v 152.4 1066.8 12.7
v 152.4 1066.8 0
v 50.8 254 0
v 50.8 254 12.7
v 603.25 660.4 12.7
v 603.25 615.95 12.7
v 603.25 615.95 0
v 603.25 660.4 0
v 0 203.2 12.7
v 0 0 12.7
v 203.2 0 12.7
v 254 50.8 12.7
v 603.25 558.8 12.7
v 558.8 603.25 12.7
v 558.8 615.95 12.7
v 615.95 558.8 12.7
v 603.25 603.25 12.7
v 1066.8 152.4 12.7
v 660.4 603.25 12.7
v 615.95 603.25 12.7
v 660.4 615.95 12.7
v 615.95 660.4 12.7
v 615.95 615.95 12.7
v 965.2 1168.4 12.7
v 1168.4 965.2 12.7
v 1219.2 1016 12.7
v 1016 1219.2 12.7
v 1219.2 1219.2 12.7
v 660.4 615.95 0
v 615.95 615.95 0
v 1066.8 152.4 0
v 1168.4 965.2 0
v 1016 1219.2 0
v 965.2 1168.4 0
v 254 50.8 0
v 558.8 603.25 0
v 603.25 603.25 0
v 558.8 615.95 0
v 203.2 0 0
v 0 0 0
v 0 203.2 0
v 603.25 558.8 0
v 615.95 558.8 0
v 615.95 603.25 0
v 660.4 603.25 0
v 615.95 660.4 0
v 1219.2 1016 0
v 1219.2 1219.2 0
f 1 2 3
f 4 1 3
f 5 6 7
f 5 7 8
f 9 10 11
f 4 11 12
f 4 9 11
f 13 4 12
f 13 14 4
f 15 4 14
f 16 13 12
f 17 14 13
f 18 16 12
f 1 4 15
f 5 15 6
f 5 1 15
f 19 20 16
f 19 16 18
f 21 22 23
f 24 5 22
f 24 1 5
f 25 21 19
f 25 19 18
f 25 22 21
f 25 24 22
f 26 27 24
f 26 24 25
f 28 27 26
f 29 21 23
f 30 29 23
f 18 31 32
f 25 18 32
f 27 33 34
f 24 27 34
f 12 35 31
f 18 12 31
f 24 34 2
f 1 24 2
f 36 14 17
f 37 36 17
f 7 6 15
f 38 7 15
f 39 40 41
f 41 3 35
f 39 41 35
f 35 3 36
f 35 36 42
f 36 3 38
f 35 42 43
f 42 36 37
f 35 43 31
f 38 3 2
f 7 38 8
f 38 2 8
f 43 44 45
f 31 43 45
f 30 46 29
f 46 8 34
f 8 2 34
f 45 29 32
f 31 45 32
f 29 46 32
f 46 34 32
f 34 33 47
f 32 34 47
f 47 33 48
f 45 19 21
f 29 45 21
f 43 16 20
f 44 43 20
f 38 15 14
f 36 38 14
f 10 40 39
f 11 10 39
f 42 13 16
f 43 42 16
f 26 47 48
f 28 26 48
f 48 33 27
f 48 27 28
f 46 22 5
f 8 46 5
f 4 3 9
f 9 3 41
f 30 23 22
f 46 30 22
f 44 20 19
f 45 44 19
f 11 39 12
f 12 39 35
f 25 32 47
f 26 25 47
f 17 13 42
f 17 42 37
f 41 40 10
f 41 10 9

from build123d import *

# Parameters (mm, degrees)
F0_W     = 1219.2
F0_H     = 1219.2
F1_DEPTH = 12.7
F3_DEPTH = 12.701
F5_DEPTH = 12.701
F6_W     = 6.35
F6_H     = 44.45
F6_W_2   = 44.45
F6_H_2   = 6.35
F7_DEPTH = 12.701


with BuildPart() as f1:
    # F0 (on Top) → F1 (new body)
    with BuildSketch(Plane.XY):
        with Locations((609.6, 609.6)):
            Rectangle(F0_W, F0_H)
    extrude(amount=F1_DEPTH)

    # F2 (on face) → F3 (cut, through all)
    with BuildSketch(Plane(origin=(0, 0, 0), x_dir=(1, 0, 0), z_dir=(0, 0, -1))):
        Polygon((50.8, -254), (0, -203.2), (0, -1219.2), (1016, -1219.2), (965.2, -1168.4), (152.4, -1066.8), align=None)
    extrude(amount=-F3_DEPTH, mode=Mode.SUBTRACT)

    # F4 (on face) → F5 (cut, through all)
    with BuildSketch(Plane(origin=(0, 0, 0), x_dir=(1, 0, 0), z_dir=(0, 0, -1))):
        Polygon((254, -50.8), (1066.8, -152.4), (1168.4, -965.2), (1219.2, -1016), (1219.2, 0), (203.2, 0), align=None)
    extrude(amount=-F5_DEPTH, mode=Mode.SUBTRACT)

    # F6 (on face) → F7 (cut, through all)
    with BuildSketch(Plane.XY.offset(12.7)):
        with Locations((606.425, 581.025)):
            Rectangle(F6_W, F6_H)
        with Locations((612.775, 581.025)):
            Rectangle(F6_W, F6_H)
        with Locations((581.025, 612.775)):
            Rectangle(F6_W_2, F6_H_2)
        with Locations((581.025, 606.425)):
            Rectangle(F6_W_2, F6_H_2)
        with Locations((638.175, 612.775)):
            Rectangle(F6_W_2, F6_H_2)
        with Locations((638.175, 606.425)):
            Rectangle(F6_W_2, F6_H_2)
        with Locations((606.425, 612.775)):
            Rectangle(F6_W, F6_H_2)
        with Locations((612.775, 612.775)):
            Rectangle(F6_W, F6_H_2)
        with Locations((606.425, 606.425)):
            Rectangle(F6_W, F6_H_2)
        with Locations((612.775, 606.425)):
            Rectangle(F6_W, F6_H_2)
        with Locations((606.425, 638.175)):
            Rectangle(F6_W, F6_H)
        with Locations((612.775, 638.175)):
            Rectangle(F6_W, F6_H)
    extrude(amount=-F7_DEPTH, mode=Mode.SUBTRACT)


solid = f1.part
